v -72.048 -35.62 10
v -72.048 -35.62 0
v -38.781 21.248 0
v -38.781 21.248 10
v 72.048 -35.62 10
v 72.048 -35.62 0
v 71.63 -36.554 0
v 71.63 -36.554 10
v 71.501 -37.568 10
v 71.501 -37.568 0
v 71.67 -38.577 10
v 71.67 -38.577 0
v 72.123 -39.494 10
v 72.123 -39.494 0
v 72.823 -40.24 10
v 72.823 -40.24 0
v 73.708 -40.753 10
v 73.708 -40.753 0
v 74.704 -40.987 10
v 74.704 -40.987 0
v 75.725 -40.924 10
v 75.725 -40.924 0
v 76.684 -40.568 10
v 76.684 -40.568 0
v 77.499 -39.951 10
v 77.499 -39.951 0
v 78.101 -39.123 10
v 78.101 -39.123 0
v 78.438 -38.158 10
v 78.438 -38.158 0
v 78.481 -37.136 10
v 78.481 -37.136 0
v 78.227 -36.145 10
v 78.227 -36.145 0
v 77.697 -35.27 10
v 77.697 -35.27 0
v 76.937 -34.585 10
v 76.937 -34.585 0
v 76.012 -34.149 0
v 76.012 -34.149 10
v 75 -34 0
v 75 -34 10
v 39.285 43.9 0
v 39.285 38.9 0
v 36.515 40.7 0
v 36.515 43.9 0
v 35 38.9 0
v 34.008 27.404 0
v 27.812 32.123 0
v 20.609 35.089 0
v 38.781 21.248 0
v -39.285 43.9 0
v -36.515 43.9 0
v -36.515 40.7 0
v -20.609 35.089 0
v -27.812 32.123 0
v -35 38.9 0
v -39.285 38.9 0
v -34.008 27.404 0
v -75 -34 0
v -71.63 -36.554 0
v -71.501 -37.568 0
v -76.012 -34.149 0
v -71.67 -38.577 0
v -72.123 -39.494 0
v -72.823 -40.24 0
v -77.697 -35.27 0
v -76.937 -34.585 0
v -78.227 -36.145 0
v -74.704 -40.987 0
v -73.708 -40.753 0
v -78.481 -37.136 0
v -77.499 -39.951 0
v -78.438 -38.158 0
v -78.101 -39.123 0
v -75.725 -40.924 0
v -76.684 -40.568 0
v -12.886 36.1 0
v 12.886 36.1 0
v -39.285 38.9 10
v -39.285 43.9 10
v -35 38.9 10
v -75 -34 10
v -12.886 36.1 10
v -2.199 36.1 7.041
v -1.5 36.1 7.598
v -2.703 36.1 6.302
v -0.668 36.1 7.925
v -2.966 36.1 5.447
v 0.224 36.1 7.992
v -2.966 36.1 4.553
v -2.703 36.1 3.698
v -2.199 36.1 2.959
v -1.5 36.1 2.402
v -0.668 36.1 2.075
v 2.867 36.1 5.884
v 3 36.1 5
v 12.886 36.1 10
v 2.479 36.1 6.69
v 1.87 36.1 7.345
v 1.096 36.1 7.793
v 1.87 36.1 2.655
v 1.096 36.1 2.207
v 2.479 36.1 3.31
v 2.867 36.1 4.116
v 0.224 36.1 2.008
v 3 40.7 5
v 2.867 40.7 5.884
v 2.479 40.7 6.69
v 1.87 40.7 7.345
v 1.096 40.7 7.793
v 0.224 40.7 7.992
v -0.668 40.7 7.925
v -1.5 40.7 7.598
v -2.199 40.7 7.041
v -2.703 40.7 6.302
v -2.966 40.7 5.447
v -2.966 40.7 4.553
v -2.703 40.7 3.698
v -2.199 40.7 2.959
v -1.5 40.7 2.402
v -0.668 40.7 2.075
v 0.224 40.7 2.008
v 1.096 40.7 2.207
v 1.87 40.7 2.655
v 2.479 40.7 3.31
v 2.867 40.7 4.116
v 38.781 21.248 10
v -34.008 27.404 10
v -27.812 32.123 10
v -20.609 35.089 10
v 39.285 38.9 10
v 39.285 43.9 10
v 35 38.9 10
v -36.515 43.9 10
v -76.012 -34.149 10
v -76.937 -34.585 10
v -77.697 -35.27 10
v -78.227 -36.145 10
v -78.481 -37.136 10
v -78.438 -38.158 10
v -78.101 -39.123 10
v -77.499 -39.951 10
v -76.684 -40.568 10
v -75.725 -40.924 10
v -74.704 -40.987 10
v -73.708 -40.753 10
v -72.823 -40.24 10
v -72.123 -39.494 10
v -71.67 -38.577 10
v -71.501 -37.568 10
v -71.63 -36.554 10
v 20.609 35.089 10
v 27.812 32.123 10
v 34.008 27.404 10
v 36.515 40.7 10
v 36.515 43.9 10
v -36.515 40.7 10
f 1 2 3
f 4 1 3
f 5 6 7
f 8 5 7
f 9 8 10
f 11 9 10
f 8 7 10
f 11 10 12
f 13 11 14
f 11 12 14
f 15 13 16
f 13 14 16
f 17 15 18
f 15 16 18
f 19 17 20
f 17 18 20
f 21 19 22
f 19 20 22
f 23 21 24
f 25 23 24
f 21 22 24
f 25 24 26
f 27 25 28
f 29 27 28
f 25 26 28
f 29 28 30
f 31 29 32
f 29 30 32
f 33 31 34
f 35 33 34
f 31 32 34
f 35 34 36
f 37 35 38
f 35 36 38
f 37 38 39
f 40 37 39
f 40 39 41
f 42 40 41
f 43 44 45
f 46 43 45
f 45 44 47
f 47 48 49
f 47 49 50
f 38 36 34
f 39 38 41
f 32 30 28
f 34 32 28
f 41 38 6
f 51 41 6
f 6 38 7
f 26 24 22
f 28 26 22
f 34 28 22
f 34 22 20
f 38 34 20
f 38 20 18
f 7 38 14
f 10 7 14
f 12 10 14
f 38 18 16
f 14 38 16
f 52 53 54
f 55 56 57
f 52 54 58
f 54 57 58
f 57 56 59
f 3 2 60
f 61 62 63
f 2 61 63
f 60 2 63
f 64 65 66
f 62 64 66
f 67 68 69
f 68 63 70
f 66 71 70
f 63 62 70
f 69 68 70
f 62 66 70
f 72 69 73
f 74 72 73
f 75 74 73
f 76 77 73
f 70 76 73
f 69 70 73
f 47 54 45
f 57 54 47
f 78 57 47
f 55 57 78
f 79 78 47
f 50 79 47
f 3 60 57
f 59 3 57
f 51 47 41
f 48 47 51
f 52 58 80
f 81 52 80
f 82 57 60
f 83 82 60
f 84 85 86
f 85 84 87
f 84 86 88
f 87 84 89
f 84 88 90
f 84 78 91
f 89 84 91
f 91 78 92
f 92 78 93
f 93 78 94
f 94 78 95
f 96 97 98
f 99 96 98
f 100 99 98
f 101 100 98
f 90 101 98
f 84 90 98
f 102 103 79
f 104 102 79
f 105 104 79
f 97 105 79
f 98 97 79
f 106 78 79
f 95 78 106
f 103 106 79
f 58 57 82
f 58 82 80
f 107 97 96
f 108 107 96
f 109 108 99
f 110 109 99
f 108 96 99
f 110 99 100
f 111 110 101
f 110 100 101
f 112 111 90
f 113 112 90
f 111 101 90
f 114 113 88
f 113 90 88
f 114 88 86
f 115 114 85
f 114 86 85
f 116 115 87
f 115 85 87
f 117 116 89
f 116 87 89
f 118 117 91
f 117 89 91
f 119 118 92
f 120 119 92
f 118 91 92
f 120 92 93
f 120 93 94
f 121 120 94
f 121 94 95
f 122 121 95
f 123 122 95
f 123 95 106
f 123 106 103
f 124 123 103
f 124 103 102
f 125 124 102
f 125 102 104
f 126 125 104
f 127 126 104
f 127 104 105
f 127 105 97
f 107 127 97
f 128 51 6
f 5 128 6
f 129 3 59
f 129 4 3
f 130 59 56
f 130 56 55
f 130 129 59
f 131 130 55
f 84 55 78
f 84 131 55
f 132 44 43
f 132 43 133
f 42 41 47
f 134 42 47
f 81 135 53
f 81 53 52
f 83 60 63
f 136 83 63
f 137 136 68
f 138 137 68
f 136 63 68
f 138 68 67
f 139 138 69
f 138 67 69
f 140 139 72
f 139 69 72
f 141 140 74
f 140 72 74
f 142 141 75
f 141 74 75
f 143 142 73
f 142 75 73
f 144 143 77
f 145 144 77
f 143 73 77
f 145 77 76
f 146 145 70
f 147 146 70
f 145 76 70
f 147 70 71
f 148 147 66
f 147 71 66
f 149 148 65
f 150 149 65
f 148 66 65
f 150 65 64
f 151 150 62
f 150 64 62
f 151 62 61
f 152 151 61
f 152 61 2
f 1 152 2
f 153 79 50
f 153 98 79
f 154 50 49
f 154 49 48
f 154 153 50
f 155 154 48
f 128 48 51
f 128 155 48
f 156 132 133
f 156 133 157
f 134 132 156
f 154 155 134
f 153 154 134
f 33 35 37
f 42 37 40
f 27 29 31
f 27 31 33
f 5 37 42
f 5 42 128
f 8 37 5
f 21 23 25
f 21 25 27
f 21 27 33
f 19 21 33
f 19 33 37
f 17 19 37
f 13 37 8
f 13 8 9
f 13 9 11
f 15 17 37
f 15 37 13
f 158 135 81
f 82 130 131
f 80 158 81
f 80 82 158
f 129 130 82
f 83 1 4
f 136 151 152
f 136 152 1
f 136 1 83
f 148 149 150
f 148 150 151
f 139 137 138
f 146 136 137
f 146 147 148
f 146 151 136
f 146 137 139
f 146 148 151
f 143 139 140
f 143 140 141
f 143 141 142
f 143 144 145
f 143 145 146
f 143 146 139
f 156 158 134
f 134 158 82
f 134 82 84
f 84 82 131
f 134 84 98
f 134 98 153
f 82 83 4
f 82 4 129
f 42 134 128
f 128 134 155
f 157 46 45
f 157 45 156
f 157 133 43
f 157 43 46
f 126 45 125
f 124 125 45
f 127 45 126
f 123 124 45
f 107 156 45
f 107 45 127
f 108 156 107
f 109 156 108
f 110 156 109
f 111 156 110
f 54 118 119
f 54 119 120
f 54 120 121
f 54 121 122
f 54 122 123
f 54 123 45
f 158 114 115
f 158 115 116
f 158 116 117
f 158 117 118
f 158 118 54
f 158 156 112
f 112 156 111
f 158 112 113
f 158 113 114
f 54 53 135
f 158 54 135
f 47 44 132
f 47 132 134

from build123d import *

# Parameters (mm, degrees)
F1_DEPTH = 10
F2_R     = 30
F3_W     = 78.57015
F3_H     = 10
F4_DEPTH = 5
F5_W     = 73.030218
F5_H     = 10
F6_DEPTH = 3.2
F7_R     = 3
F8_DEPTH = 7.801


with BuildPart() as f1:
    # F0 (on Top) → F1 (new body)
    with BuildSketch(Plane.XY):
        with BuildLine():
            Line((-35, 38.9), (-75, -34))
            ThreePointArc((-75, -34), (-76.683645, -40.568443), (-72.047904, -35.619806))
            Line((-72.047904, -35.619806), (-30.092474, 36.1))
            Line((-30.092474, 36.1), (30.092474, 36.1))
            Line((30.092474, 36.1), (72.047904, -35.619806))
            ThreePointArc((72.047904, -35.619806), (76.683645, -40.568443), (75, -34))
            Line((75, -34), (35, 38.9))
            Line((35, 38.9), (-35, 38.9))
        make_face()
    extrude(amount=F1_DEPTH)

    # F2
    f2_edges = [f1.edges().sort_by_distance(p)[0] for p in [
        (-30.092474, 36.1, 5),
        (30.092474, 36.1, 5),
    ]]
    fillet(f2_edges, radius=F2_R)

    # F3 (on face) → F4 (join)
    with BuildSketch(Plane(origin=(0, 38.9, 0), x_dir=(-1, 0, 0), z_dir=(0, 1, 0))):
        with Locations((0, 5)):
            Rectangle(F3_W, F3_H)
    extrude(amount=F4_DEPTH)

    # F5 (on face) → F6 (cut)
    with BuildSketch(Plane(origin=(0, 43.9, 0), x_dir=(-1, 0, 0), z_dir=(0, 1, 0))):
        with Locations((0, 5)):
            Rectangle(F5_W, F5_H)
    extrude(amount=-F6_DEPTH, mode=Mode.SUBTRACT)

    # F7 (on face) → F8 (cut, through all)
    with BuildSketch(Plane.XZ.offset(-36.1)):
        with Locations((0, 5)):
            Circle(F7_R)
    extrude(amount=-F8_DEPTH, mode=Mode.SUBTRACT)


solid = f1.part
